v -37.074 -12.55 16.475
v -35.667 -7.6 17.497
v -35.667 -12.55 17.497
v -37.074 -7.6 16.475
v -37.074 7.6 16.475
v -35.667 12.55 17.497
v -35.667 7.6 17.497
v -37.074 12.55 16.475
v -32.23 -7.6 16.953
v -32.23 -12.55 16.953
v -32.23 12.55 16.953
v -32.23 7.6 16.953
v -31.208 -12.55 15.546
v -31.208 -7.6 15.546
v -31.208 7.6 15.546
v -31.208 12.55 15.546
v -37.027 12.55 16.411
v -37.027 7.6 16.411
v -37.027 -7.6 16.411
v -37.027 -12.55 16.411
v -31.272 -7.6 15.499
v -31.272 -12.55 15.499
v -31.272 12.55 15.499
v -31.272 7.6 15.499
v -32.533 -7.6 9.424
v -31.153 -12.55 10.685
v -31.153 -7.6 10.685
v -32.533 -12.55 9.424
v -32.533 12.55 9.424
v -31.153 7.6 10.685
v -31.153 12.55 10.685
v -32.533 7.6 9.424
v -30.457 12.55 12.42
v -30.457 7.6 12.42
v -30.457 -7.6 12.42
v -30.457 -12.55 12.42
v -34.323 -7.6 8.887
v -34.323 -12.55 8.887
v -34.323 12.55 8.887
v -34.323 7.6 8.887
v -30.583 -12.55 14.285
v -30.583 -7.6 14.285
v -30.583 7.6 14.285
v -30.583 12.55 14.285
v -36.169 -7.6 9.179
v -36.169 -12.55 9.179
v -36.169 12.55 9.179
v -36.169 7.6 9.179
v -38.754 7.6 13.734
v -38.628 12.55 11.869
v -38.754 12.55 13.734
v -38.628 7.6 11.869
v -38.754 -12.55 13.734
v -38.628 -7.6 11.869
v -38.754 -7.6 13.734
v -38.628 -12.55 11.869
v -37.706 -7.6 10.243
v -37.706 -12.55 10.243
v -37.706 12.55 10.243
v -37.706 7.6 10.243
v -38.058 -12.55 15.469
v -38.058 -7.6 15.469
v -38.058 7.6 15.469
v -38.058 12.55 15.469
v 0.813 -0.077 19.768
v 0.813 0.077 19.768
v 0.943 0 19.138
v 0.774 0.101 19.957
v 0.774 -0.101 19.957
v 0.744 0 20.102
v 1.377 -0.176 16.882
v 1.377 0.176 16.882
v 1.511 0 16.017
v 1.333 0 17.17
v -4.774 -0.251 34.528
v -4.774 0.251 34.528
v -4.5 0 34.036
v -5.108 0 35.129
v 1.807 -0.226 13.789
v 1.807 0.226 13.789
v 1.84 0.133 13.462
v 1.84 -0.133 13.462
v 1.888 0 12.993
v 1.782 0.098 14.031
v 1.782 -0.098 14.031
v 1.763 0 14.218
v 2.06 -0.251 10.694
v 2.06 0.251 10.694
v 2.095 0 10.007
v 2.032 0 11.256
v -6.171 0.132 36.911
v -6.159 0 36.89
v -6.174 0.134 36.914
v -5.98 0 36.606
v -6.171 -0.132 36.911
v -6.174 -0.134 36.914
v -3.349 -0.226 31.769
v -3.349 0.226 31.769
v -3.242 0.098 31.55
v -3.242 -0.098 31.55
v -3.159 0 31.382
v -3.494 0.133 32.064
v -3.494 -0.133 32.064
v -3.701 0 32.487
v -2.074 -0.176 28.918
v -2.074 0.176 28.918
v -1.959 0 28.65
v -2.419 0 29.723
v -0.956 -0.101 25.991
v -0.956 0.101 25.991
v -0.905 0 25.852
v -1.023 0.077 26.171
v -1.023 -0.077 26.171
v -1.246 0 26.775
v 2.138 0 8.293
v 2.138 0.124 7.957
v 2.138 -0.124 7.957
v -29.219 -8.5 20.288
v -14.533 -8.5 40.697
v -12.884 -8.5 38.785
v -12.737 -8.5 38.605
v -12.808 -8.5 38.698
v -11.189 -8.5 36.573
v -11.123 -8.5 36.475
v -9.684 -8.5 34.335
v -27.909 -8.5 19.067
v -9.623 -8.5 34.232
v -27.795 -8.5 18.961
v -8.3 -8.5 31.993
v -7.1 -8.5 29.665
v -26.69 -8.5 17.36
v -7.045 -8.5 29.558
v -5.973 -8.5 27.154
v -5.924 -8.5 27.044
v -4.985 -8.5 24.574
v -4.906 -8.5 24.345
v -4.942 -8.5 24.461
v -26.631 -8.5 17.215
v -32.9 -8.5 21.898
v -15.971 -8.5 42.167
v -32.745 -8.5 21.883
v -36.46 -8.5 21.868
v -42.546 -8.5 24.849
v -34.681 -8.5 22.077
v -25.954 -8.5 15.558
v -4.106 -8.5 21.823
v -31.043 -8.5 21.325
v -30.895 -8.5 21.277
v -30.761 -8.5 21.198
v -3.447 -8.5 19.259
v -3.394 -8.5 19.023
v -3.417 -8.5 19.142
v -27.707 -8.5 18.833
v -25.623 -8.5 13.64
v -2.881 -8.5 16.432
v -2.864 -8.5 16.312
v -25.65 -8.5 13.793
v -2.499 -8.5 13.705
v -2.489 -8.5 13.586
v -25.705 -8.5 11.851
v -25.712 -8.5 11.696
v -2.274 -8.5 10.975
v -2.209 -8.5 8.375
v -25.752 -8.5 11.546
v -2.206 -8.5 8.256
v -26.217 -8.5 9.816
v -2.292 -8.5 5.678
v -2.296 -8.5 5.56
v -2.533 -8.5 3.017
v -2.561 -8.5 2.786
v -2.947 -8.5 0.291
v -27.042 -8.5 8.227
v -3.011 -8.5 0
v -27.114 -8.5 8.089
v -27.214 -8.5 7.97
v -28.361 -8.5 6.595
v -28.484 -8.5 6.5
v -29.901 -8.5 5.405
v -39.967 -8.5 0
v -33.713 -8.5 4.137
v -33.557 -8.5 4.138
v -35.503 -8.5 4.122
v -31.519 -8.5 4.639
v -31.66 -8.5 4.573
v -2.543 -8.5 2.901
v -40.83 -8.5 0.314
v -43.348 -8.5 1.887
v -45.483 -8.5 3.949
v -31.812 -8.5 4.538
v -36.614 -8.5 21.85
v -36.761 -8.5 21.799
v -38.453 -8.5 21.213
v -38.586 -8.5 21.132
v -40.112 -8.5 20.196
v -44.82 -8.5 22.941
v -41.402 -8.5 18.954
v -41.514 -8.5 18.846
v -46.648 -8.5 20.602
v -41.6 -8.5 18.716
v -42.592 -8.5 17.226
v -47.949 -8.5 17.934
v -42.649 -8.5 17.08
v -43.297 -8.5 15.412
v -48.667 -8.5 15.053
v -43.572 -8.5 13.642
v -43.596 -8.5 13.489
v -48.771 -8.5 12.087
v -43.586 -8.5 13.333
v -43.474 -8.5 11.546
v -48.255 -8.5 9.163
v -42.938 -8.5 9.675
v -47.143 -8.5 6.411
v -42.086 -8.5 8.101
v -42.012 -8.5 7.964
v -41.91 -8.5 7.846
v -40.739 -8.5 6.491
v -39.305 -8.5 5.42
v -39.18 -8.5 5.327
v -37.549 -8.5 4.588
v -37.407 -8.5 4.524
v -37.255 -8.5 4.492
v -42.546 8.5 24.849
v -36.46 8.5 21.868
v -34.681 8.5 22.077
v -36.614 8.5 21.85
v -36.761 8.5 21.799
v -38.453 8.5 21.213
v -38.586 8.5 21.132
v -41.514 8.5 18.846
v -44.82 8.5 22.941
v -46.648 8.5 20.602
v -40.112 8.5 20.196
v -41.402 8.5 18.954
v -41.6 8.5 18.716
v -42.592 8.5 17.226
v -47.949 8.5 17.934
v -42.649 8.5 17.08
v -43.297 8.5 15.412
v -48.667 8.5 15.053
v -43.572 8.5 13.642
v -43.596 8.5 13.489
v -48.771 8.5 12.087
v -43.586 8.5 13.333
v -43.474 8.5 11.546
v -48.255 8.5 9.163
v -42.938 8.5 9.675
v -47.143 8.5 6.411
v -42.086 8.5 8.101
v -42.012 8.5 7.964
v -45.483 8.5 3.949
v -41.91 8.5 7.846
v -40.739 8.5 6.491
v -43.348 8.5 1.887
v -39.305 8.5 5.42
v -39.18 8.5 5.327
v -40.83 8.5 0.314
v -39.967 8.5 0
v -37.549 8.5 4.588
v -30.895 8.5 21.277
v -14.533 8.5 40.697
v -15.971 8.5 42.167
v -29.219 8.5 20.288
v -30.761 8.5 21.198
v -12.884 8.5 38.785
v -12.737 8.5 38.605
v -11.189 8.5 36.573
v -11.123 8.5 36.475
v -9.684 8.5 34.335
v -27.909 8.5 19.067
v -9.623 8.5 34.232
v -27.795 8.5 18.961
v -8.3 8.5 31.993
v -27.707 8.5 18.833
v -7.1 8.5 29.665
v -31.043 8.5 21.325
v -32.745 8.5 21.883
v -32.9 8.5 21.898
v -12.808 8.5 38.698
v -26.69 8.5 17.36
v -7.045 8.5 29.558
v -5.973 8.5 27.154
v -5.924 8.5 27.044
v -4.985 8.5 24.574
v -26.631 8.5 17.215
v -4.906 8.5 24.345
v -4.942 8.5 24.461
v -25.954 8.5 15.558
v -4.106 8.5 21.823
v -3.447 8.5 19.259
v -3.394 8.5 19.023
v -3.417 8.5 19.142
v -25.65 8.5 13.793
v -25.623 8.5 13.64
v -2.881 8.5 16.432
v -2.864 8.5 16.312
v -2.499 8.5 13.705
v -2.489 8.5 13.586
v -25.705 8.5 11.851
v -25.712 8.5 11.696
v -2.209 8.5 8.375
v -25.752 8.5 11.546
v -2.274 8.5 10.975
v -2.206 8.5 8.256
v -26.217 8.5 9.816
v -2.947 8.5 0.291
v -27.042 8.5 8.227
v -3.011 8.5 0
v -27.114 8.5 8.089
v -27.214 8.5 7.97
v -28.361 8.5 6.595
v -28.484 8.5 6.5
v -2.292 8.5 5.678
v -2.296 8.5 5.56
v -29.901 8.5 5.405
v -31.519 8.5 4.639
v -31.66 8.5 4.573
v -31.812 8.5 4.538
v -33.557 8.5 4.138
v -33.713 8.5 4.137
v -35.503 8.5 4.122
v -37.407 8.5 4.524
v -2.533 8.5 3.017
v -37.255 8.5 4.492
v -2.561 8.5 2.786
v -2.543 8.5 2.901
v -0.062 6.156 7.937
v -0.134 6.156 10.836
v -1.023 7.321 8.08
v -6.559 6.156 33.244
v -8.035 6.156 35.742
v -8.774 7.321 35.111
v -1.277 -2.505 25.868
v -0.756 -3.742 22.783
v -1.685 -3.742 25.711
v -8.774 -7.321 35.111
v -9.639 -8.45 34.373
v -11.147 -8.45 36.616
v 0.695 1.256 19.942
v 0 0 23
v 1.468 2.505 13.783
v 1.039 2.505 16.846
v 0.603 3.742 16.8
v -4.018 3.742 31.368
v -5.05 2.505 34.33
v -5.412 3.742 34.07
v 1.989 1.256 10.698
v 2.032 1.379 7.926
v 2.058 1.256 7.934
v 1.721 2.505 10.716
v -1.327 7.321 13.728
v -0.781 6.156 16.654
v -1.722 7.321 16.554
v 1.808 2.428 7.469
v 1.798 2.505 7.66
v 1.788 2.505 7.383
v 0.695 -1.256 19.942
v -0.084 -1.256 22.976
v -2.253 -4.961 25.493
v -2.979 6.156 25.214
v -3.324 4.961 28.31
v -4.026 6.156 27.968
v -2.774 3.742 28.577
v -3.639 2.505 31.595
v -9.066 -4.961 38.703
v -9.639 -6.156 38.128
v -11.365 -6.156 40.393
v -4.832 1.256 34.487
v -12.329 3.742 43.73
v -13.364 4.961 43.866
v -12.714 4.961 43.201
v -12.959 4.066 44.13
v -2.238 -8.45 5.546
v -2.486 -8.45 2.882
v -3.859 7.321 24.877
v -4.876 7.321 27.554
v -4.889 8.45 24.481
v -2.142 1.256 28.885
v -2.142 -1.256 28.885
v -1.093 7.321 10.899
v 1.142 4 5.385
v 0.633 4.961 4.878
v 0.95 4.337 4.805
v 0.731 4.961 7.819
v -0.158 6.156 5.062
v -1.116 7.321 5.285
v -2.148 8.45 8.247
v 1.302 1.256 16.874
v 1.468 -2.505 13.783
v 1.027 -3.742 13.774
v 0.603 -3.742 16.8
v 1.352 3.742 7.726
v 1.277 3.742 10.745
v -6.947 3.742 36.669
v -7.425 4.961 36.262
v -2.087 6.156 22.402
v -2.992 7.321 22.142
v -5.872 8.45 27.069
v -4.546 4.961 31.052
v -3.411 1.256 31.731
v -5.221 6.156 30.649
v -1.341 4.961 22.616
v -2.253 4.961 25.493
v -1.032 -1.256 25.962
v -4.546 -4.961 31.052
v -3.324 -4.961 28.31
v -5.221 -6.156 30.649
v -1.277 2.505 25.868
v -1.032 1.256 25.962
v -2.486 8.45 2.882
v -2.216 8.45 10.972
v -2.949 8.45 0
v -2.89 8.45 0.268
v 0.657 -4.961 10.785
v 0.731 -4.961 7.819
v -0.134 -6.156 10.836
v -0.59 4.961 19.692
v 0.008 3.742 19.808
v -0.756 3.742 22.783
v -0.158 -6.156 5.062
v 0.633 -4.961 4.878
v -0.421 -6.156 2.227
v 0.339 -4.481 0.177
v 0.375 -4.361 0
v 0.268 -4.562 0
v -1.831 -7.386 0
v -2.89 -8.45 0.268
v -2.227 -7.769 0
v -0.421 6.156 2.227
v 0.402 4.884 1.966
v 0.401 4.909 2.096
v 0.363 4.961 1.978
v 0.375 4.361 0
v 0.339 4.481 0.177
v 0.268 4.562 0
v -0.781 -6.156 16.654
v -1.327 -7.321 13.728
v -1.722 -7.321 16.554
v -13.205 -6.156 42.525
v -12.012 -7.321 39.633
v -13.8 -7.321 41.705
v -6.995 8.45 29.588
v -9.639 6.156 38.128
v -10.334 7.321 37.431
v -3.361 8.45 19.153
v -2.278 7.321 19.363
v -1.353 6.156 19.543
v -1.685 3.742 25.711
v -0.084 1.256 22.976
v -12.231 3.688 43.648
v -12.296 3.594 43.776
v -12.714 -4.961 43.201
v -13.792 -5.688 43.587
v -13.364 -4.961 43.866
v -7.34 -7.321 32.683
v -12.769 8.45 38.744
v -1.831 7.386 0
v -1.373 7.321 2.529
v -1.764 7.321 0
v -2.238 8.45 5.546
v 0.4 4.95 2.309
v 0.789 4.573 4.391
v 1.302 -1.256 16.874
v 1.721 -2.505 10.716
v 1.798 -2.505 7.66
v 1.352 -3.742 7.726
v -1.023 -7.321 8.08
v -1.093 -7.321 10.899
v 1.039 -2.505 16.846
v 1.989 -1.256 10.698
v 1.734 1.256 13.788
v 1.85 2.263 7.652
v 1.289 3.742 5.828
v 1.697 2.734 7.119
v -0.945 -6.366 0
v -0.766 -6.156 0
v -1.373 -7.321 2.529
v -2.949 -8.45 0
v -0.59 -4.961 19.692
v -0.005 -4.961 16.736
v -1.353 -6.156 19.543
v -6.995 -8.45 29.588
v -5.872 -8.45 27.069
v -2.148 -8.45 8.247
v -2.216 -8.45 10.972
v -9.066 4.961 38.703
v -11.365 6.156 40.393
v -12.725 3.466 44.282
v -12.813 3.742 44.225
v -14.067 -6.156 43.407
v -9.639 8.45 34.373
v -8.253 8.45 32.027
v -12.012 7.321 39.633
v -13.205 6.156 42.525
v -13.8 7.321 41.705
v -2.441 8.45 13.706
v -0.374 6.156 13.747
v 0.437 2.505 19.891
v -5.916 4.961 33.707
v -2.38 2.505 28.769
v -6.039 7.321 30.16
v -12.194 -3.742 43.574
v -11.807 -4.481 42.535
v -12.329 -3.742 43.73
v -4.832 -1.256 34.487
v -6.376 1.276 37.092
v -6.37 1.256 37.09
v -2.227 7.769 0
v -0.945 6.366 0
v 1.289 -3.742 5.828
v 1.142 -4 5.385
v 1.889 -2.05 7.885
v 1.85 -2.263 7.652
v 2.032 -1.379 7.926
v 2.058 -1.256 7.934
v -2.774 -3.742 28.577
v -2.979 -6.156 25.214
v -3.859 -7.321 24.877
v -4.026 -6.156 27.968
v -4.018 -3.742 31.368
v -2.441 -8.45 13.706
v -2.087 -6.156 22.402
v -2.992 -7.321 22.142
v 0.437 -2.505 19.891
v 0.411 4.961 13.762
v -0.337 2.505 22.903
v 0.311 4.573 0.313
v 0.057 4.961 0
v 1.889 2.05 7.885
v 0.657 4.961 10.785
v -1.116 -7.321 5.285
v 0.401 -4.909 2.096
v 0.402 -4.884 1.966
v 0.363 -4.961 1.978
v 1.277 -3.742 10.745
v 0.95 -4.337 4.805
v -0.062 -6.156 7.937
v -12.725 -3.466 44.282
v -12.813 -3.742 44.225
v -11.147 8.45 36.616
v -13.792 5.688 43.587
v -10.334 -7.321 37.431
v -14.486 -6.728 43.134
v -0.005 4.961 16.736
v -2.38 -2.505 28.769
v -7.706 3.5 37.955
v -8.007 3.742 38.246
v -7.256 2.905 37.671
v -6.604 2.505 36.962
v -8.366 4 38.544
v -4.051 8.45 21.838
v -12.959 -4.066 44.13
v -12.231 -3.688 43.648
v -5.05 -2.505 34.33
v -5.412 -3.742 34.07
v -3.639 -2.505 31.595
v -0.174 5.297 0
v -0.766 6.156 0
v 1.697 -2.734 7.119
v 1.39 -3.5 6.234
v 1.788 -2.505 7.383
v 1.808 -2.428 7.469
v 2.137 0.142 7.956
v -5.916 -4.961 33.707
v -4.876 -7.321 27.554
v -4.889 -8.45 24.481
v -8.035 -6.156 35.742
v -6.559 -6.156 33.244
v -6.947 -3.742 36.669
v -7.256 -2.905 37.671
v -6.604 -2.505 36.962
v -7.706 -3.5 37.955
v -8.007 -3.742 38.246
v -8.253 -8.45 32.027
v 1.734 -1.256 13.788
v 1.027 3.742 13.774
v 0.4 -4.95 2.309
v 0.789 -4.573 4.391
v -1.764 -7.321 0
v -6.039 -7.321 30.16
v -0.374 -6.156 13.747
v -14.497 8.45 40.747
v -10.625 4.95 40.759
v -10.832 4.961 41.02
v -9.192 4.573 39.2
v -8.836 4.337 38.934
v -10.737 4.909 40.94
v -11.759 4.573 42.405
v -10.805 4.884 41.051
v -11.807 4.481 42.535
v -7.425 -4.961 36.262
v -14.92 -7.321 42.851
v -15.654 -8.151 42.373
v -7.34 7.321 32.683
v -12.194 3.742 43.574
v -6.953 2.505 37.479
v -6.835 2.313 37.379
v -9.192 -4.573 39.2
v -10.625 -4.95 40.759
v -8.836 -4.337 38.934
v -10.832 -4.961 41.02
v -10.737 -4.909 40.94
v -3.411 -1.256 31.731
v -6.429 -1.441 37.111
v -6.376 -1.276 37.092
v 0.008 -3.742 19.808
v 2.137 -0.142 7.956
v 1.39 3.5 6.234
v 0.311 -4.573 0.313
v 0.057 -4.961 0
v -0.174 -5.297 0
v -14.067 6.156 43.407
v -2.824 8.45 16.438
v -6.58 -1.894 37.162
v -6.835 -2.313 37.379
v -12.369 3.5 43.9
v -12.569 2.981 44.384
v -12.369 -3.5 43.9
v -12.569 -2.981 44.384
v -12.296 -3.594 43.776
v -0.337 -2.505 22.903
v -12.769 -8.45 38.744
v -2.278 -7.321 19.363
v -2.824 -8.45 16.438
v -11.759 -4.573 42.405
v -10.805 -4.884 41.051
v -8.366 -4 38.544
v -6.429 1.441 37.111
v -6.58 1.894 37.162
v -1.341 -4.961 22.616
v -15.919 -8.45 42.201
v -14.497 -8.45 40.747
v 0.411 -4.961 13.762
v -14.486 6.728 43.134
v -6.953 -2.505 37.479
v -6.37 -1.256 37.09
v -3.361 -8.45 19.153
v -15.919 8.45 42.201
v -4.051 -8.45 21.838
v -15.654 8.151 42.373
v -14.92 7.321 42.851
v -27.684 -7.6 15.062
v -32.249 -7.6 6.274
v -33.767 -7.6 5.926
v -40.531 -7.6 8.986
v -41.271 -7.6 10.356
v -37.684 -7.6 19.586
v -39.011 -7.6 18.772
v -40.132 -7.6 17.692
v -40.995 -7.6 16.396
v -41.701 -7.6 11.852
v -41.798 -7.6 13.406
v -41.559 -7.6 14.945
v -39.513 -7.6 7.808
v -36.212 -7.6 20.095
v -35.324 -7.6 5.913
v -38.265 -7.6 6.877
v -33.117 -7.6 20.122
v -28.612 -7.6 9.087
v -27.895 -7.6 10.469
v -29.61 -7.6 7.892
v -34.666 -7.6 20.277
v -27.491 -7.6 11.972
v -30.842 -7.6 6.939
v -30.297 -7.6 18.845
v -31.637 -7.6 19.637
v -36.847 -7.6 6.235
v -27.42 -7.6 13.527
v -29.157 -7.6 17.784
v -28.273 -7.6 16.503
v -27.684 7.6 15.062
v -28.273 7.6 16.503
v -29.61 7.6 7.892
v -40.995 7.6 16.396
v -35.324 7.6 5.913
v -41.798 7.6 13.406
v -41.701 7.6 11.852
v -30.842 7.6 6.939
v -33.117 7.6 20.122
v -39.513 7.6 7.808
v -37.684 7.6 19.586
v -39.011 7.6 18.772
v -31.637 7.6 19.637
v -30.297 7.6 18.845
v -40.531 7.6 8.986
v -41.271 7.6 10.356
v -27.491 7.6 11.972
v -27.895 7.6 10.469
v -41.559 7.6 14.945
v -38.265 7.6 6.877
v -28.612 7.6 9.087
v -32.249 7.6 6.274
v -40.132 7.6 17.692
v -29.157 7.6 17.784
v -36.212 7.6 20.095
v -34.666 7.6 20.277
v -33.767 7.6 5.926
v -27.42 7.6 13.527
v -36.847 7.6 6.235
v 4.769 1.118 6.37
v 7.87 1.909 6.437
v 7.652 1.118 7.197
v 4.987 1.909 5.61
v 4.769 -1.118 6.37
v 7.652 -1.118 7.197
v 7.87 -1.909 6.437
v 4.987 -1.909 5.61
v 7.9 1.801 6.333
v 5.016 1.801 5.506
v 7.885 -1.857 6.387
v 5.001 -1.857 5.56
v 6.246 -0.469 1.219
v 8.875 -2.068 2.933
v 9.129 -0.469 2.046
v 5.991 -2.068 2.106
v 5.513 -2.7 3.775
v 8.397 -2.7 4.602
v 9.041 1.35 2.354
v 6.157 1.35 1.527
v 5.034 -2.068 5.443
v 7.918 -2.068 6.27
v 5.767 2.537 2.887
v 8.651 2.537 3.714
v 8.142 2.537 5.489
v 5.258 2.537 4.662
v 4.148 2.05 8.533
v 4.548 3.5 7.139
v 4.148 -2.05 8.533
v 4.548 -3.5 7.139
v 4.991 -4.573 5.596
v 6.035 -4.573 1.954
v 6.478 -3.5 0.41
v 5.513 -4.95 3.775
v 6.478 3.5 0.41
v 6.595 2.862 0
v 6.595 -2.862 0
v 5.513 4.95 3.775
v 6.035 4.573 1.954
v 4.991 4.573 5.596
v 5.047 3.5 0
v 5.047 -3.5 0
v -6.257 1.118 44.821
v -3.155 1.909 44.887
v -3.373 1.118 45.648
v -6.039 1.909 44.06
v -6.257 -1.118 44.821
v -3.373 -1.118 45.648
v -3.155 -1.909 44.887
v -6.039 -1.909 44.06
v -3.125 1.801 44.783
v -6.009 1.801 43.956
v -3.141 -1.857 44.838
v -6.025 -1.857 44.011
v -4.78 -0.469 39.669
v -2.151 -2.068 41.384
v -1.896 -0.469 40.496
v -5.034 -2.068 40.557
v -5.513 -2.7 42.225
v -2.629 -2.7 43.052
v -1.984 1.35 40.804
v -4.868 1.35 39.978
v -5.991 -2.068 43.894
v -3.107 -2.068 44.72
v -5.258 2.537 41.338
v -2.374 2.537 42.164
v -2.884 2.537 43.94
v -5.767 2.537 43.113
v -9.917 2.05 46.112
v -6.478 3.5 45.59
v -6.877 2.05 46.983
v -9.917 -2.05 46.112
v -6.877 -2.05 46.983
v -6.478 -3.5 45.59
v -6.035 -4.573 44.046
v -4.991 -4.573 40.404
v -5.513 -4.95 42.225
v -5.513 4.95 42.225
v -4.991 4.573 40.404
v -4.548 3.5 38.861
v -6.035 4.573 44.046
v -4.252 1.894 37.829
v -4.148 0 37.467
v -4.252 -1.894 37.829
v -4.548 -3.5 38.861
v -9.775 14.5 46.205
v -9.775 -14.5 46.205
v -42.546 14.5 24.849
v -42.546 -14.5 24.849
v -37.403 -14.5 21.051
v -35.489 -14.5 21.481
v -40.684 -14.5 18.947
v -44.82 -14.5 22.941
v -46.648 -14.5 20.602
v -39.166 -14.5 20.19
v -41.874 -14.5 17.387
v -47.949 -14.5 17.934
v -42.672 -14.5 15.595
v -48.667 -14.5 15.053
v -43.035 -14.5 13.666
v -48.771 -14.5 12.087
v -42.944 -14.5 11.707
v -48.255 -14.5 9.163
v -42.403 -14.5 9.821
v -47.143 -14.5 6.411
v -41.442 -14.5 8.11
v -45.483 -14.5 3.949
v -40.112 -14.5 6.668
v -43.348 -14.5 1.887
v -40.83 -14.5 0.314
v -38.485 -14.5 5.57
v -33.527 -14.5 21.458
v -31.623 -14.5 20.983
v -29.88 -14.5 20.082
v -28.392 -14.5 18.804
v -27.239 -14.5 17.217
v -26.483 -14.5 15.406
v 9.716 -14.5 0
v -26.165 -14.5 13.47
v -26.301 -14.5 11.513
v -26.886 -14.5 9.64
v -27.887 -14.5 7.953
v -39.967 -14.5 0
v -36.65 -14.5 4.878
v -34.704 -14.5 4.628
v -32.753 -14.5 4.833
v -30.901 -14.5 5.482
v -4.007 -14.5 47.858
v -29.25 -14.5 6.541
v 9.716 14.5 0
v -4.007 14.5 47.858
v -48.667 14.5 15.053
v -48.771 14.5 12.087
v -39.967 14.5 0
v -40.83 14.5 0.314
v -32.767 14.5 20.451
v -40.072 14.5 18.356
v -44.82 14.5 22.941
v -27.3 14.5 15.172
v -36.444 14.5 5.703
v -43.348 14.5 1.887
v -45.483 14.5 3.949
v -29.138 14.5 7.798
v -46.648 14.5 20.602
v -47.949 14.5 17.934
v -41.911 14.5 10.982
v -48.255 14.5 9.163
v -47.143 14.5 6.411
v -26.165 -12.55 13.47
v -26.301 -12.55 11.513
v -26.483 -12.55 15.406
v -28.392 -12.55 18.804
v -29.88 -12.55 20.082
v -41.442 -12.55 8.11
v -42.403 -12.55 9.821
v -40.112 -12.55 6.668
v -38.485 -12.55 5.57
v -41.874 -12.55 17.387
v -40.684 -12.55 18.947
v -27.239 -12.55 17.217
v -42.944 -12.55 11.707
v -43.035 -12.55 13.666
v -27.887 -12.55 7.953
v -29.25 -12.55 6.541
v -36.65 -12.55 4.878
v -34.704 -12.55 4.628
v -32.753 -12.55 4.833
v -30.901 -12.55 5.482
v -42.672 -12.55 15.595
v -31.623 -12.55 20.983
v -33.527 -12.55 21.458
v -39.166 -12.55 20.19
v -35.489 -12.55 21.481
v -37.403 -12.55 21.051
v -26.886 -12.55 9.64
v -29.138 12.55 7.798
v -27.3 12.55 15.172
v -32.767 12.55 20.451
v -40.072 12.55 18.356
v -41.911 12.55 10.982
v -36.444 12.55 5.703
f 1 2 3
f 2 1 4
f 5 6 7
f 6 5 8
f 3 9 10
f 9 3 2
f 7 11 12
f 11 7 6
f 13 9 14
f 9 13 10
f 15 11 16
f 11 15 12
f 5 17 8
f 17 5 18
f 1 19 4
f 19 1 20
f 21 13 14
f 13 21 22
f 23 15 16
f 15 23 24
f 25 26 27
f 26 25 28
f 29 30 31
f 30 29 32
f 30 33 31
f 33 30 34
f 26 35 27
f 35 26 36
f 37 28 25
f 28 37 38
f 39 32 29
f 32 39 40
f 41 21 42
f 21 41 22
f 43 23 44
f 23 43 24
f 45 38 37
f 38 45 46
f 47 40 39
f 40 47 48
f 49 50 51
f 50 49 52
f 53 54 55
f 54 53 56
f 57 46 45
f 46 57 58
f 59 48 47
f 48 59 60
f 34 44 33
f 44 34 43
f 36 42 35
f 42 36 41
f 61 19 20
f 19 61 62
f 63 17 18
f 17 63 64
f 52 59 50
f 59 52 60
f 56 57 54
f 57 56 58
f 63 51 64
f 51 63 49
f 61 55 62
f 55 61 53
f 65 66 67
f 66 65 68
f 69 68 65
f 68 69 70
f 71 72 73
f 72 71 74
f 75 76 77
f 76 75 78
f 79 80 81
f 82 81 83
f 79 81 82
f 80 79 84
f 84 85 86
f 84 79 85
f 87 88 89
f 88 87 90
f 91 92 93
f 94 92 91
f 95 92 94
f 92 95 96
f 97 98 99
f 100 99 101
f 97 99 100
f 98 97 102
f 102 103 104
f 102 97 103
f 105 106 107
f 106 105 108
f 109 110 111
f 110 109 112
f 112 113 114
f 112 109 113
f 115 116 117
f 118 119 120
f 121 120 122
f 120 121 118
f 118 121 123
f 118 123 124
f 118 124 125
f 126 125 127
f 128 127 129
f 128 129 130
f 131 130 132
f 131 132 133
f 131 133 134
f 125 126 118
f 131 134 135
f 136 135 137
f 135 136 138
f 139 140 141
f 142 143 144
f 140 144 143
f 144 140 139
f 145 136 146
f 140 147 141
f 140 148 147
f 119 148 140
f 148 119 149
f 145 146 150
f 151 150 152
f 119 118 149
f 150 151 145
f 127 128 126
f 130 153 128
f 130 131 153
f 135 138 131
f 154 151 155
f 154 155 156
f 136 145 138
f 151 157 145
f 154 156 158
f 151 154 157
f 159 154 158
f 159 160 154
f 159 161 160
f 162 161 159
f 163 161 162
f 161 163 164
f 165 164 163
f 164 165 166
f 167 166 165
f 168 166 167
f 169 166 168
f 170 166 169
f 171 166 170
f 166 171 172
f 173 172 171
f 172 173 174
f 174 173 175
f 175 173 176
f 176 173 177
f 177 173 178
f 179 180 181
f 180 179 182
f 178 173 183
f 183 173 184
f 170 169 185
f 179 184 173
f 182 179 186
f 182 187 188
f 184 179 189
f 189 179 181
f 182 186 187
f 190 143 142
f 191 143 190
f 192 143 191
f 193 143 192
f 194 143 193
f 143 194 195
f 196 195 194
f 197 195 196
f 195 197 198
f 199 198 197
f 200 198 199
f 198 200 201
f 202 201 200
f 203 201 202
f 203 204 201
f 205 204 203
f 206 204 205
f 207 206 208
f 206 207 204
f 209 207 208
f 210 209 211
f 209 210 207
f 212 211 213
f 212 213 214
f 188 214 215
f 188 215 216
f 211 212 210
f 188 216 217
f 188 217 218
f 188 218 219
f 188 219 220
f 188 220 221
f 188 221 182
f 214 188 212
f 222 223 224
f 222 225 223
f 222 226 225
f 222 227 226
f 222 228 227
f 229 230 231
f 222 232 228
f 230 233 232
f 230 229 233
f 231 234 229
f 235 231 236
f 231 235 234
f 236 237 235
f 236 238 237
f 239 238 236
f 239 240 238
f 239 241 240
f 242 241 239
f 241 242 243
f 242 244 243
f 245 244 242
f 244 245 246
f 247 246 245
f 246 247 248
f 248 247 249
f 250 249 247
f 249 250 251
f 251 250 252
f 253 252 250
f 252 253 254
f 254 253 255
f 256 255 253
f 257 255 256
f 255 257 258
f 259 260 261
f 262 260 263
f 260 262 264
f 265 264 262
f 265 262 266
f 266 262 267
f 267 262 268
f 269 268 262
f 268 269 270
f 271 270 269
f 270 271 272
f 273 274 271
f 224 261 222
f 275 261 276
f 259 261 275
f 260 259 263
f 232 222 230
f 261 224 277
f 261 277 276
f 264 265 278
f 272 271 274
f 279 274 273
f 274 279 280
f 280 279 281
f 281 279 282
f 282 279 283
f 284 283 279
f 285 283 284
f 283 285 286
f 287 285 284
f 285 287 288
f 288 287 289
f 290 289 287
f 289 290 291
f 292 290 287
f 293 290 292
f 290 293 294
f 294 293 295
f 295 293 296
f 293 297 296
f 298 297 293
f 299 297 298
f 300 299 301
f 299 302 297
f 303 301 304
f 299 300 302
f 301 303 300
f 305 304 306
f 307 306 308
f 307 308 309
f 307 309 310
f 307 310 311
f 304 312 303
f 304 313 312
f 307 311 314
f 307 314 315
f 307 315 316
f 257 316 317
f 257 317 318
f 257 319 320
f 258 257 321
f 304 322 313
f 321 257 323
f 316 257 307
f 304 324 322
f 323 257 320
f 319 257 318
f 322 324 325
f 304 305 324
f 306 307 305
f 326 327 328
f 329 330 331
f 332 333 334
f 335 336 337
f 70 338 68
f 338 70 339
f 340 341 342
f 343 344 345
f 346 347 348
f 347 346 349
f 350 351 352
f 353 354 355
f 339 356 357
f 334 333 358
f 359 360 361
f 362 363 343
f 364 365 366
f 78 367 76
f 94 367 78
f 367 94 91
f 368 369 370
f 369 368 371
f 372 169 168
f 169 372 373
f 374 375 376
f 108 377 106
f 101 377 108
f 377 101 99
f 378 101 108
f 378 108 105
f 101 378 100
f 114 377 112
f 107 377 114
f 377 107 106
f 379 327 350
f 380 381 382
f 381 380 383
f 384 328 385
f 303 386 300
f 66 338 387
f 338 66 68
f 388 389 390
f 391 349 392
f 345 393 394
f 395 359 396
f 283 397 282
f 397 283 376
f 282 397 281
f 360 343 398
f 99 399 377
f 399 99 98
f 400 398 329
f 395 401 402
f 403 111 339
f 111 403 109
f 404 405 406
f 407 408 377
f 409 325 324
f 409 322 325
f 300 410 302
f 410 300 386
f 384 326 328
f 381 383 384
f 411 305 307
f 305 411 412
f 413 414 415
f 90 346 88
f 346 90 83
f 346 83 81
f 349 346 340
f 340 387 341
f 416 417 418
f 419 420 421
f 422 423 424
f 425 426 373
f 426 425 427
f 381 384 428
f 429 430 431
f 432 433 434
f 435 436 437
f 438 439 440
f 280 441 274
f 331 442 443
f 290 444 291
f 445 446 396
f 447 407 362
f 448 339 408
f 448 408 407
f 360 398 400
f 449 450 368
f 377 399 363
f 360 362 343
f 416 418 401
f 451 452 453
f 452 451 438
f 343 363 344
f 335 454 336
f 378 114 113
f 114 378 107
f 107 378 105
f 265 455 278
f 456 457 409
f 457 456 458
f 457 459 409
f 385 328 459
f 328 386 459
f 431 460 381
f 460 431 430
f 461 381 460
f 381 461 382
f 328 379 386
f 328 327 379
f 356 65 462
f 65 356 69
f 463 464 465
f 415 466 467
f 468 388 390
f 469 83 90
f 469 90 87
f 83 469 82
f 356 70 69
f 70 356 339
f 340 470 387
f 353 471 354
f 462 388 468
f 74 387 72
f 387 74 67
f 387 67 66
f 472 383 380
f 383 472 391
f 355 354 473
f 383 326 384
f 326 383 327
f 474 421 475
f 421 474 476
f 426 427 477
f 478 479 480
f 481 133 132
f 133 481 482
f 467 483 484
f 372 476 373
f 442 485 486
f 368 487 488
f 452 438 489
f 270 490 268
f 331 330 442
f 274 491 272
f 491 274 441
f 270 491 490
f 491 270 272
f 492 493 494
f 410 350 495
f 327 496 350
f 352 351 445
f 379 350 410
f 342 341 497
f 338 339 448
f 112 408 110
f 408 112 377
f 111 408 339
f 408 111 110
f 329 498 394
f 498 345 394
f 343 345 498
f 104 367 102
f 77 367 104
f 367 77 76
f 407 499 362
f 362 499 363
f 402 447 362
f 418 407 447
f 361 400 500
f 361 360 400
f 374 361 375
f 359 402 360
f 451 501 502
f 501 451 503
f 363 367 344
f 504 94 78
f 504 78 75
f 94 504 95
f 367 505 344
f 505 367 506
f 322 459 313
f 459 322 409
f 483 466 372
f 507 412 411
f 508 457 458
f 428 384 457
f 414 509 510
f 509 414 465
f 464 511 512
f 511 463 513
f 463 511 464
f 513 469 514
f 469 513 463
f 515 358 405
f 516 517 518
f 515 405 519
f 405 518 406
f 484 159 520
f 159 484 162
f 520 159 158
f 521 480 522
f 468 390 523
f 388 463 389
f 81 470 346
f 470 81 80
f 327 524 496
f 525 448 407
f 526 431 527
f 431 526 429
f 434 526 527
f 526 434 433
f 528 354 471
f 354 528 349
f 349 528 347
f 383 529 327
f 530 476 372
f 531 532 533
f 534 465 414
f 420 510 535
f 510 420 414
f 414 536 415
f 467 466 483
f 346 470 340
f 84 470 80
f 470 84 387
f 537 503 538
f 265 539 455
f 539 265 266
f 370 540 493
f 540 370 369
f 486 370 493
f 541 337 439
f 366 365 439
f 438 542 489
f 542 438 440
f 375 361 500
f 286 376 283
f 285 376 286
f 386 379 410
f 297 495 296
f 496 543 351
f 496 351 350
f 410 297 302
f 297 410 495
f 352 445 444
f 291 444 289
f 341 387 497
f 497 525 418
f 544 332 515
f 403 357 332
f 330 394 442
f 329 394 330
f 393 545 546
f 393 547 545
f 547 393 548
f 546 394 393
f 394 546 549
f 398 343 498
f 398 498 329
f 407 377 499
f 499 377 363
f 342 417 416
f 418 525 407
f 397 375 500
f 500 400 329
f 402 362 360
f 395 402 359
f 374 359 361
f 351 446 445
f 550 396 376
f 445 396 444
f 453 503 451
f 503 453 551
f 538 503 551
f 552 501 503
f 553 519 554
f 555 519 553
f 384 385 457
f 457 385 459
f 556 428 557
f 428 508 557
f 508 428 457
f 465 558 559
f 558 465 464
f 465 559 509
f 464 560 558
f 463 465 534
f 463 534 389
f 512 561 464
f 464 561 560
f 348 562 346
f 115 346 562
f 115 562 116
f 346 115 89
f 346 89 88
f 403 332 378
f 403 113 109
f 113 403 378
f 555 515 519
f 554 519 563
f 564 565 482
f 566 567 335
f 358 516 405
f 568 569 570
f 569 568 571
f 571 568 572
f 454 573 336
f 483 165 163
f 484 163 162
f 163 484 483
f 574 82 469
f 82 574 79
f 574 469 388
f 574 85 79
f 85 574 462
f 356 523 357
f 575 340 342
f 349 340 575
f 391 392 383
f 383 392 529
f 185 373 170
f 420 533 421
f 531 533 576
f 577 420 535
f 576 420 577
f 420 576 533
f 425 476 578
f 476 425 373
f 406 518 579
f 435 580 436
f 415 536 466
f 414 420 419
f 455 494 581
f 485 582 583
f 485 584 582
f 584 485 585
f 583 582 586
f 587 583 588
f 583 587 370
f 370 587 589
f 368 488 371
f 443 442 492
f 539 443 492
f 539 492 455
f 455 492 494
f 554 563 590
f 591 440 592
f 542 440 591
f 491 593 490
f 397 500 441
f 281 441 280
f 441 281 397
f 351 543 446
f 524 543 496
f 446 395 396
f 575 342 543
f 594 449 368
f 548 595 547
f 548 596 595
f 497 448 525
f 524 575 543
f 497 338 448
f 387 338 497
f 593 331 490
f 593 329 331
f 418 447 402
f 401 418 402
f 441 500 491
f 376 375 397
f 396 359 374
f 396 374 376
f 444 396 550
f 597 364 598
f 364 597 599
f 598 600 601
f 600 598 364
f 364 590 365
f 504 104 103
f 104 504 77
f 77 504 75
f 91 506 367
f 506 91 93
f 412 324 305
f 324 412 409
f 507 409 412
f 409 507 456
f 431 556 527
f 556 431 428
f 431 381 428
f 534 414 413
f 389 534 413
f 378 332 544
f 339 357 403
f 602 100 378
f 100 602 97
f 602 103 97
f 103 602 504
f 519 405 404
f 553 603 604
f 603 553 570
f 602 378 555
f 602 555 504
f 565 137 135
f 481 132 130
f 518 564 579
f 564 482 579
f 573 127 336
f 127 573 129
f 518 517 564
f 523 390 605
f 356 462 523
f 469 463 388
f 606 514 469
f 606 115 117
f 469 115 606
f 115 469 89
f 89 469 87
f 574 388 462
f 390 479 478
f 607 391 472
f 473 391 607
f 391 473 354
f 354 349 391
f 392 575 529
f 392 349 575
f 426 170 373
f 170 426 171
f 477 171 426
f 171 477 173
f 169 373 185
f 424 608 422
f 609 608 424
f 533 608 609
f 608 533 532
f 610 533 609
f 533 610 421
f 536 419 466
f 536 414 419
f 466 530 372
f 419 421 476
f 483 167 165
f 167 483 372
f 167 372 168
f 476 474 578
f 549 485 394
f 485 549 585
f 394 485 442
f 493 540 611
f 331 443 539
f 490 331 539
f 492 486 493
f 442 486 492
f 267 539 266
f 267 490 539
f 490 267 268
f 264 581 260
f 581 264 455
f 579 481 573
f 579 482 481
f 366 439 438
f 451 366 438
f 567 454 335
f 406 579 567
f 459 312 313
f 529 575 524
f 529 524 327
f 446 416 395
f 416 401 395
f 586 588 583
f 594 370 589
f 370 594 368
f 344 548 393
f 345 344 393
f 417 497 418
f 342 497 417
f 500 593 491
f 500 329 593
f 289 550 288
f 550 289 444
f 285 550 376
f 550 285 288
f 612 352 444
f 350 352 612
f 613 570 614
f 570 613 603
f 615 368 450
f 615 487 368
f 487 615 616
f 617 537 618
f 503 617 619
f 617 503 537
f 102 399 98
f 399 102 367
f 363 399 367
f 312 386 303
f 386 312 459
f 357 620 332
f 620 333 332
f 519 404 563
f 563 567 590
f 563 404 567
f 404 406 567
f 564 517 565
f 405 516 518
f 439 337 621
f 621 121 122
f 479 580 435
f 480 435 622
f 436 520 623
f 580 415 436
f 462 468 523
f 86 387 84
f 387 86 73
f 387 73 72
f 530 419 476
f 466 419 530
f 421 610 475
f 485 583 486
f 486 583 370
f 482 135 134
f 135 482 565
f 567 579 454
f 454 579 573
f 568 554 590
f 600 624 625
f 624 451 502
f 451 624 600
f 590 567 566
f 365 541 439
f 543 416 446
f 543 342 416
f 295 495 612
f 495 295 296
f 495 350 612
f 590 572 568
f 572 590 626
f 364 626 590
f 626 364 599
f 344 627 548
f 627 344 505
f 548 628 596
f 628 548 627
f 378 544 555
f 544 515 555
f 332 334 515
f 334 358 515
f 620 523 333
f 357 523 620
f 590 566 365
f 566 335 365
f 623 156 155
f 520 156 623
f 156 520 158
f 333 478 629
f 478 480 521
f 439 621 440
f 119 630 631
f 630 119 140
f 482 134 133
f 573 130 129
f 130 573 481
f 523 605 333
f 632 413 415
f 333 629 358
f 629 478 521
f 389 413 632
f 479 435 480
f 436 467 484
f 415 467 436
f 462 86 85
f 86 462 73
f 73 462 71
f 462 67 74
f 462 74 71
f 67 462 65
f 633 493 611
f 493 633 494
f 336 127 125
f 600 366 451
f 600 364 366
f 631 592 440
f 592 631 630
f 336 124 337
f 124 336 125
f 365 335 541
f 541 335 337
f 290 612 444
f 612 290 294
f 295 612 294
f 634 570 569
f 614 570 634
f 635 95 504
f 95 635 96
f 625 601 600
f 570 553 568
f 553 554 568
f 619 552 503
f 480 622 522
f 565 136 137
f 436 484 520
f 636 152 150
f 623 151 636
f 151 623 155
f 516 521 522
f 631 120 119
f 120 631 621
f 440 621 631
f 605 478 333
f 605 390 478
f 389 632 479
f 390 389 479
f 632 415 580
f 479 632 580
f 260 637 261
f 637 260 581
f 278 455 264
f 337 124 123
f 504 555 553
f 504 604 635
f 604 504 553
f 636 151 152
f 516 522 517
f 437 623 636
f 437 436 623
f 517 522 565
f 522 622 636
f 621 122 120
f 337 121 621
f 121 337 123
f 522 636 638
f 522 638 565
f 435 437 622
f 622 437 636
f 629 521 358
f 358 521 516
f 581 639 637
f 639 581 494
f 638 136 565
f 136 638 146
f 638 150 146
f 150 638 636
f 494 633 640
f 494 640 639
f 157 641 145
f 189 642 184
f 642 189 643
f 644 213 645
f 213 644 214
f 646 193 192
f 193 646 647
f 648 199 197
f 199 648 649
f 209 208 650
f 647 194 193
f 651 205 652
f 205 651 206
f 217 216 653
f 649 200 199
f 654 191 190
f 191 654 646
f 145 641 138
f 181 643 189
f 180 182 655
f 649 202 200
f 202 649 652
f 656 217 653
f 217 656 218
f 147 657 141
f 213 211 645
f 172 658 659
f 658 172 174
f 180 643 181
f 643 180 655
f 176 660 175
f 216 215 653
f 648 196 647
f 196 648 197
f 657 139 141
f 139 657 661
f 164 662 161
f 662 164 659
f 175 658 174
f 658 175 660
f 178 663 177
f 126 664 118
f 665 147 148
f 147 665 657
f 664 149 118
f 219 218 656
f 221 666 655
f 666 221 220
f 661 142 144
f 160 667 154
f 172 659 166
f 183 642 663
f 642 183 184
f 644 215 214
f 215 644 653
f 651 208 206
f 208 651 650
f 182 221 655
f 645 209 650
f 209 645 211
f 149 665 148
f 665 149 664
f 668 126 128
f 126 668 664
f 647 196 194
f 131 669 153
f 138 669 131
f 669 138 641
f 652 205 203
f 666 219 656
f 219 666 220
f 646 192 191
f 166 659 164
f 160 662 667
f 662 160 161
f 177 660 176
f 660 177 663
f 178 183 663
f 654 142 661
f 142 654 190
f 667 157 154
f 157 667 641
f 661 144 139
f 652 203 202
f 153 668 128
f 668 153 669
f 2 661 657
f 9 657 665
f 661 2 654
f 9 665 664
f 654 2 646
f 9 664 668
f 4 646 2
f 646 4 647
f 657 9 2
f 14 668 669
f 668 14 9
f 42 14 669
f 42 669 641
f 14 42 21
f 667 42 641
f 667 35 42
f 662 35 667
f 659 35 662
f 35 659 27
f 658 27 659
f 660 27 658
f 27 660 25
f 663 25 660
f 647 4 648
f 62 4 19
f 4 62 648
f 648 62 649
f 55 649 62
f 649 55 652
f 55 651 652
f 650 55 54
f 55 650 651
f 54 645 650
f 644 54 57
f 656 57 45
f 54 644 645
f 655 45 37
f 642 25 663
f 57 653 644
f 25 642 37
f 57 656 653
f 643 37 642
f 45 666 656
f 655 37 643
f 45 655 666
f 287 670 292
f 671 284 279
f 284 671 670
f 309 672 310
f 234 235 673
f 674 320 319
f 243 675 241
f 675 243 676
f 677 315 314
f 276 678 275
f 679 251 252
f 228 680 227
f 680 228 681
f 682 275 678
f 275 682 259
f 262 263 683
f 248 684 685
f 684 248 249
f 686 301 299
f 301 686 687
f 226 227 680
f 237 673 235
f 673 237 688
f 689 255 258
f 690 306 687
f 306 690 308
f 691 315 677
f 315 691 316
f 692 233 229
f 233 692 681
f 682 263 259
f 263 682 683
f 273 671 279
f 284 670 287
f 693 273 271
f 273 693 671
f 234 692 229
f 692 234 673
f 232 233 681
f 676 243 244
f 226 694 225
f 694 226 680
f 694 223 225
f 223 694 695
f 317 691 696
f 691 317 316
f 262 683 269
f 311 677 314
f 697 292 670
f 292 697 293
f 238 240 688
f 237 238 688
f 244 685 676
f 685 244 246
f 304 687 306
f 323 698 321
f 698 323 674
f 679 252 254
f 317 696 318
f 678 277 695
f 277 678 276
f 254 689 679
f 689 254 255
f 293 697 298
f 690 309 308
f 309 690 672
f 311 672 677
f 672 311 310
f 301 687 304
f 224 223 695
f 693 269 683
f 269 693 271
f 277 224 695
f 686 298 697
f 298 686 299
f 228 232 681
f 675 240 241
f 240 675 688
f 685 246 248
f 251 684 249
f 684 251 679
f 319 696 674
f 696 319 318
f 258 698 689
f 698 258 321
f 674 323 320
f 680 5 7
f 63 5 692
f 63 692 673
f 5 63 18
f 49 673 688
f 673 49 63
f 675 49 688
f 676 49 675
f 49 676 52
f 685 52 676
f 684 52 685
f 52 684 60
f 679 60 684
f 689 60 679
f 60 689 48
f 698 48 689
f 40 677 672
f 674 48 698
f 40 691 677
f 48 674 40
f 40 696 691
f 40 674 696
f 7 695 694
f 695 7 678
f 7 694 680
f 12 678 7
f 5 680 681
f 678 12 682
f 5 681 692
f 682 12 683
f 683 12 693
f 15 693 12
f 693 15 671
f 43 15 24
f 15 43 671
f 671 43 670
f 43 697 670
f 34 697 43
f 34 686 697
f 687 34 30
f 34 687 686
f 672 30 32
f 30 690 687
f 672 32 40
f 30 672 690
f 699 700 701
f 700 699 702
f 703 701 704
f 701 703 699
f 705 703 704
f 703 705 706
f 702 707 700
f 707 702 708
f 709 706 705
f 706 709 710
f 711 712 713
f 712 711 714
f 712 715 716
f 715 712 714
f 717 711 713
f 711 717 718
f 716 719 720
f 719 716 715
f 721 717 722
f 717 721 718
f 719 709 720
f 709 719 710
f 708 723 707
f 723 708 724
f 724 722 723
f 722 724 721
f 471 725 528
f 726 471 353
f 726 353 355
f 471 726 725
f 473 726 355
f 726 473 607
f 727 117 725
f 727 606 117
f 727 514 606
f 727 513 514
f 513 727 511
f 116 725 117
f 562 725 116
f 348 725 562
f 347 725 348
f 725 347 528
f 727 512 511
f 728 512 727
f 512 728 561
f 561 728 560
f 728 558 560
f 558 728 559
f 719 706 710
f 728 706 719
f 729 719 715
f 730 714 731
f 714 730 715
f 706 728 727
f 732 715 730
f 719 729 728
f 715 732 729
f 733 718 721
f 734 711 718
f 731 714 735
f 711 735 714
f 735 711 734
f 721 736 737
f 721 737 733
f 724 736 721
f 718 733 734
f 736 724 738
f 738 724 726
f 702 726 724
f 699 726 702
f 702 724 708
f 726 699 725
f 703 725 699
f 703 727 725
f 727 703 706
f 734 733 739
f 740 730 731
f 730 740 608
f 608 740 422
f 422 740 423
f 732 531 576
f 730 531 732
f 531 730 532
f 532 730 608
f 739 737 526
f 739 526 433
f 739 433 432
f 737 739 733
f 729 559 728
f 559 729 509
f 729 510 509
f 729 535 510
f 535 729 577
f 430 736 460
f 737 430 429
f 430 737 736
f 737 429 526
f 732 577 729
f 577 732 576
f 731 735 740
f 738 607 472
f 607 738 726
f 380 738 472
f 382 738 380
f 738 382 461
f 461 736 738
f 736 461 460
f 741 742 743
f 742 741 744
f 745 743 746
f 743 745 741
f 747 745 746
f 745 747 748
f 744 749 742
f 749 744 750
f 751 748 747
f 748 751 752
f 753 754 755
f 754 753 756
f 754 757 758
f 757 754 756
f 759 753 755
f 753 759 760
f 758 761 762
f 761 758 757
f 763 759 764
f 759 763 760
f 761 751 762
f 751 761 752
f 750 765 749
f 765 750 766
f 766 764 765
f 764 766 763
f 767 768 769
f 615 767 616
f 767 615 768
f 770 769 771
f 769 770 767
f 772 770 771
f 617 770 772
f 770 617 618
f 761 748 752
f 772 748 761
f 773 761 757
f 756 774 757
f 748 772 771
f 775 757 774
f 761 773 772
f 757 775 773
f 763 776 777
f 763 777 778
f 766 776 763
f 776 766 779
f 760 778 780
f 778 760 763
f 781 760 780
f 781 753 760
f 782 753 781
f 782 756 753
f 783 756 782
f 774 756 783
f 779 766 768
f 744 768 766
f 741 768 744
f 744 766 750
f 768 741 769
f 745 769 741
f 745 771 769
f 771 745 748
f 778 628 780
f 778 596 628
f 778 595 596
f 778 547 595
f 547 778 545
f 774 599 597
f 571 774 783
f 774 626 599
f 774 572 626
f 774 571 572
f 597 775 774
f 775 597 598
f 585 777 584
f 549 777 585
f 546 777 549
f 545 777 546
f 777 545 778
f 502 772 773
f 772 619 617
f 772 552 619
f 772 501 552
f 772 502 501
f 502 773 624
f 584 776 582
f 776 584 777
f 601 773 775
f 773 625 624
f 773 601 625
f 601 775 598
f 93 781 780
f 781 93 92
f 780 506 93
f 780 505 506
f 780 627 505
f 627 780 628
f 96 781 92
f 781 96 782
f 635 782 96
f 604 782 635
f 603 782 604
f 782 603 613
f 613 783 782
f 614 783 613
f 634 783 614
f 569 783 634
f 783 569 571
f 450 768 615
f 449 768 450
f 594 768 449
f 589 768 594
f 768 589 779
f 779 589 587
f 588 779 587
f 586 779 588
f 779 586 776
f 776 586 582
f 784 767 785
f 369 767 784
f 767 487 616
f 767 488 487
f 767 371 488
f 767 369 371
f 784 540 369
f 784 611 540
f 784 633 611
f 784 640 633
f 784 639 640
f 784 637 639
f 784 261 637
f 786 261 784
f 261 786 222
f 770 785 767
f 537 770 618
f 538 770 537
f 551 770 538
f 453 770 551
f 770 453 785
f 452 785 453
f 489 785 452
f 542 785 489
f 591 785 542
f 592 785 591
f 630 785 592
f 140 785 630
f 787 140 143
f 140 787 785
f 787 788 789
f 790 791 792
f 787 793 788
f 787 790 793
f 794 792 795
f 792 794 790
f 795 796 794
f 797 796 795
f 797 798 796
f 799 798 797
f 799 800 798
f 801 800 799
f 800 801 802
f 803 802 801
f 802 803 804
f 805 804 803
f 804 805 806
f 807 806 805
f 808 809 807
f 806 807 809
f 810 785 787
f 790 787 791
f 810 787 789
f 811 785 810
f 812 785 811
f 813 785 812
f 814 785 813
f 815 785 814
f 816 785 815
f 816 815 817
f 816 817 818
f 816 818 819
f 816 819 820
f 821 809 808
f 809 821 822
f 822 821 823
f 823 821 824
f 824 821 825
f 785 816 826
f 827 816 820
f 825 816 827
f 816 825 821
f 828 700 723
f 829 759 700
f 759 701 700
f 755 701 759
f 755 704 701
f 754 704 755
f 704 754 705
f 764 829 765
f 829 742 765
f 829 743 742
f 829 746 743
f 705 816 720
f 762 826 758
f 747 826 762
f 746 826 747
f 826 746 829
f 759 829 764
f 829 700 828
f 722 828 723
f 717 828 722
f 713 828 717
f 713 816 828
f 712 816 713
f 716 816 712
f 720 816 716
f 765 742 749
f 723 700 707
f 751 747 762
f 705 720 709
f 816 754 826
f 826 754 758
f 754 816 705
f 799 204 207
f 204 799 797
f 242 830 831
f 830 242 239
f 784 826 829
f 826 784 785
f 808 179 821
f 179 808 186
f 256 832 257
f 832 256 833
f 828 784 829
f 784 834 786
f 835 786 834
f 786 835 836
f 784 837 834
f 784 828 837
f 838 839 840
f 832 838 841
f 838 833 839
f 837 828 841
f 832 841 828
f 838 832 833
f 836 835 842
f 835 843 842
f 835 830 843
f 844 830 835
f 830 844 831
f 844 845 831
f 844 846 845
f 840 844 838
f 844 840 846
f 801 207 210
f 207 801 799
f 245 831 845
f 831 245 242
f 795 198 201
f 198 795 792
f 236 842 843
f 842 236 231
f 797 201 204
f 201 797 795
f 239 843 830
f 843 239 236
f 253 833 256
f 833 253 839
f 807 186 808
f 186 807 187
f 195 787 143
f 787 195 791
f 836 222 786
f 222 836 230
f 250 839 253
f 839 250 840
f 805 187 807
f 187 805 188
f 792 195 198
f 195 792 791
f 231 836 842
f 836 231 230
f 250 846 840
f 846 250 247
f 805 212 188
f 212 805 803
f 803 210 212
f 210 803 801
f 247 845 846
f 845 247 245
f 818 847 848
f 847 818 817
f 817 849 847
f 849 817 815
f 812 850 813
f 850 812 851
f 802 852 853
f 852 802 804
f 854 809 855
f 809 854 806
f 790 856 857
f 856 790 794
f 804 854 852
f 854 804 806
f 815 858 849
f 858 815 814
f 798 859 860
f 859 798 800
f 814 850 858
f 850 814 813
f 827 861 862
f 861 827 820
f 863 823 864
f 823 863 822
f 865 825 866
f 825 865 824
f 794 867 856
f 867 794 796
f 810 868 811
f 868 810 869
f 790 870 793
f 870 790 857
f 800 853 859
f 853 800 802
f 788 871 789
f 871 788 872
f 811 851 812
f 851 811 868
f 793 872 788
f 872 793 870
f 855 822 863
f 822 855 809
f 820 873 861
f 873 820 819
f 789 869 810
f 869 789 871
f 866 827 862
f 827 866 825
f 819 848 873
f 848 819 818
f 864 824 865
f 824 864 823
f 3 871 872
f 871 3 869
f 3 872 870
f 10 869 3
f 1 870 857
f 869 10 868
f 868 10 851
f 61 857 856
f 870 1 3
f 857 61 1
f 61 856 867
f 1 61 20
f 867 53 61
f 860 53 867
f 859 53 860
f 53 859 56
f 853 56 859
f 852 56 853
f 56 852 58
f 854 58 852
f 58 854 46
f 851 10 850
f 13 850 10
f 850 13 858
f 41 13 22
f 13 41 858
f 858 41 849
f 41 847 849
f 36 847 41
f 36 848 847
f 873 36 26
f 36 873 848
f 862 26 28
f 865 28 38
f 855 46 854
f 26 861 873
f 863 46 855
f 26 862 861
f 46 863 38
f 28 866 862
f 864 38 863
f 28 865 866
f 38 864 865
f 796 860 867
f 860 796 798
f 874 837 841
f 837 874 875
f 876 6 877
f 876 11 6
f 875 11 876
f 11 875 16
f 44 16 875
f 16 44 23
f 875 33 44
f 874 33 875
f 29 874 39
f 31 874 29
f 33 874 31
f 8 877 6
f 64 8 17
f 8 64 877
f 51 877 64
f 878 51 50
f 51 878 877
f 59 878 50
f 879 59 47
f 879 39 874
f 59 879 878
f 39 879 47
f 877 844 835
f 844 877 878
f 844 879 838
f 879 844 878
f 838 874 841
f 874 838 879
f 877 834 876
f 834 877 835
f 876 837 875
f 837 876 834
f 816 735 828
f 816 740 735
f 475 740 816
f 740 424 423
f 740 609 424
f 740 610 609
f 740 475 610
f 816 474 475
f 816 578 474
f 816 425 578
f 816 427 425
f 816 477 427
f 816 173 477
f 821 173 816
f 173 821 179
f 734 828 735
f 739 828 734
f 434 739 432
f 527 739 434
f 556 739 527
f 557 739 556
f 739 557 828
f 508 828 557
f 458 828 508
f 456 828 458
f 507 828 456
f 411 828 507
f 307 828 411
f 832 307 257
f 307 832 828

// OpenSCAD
slop = .2;

m8_dia = 8;
m8_rad = m8_dia/2+slop;
m8_cap_rad = 12/2;
m8_nut_thick = 6.8;
m8_nut_dia = 14.6;
m8_nut_rad = m8_nut_dia/2+slop;
m8_washer_dia = 16;
m8_washer_rad = m8_washer_dia/2+slop;
m8_washer_thick = 1.8;

m5_nut_rad = 8.79/2+slop;
m5_nut_height = 4.7;
m5_rad = 5/2+slop;
m5_cap_rad = 9/2+slop;

wall = 6;

%cylinder(r=m8_washer_rad,h=20);
%rotate([90,0,0])translate([-34.5,13,-2]) cylinder(r=m8_rad, h=30, center=true);

//the wheel
//translate([-31,T/2,9]) rotate([90,0,0]) //this puts the wheel in the carrier
*wheel();

//the carrier
//rotated for printing
difference(){
	translate([0,0,23]) rotate([0,-16,0])
	carrier();
	translate([0,0,-50]) cube([100,100,100], center=true);
}

module carrier(){
	thickness = wall+wall+1+1+T;
	difference(){
		union(){
			hull(){
				cube([wall, thickness, 50], center=true);
				
				translate([-D/2-wall,0,0]) rotate([90,0,0]) cylinder(r=m8_washer_rad+wall, h=thickness, center=true);
			}
		}

		//mount the wheel
		translate([-D/2-wall,0,0]) rotate([-90,0,0]) {
			rotate([0,0,25]) cap_cylinder(r=m8_rad, h=50, center=true);
			difference(){
				scale([1,1.25,1]) intersection(){
					cylinder(r=D/2+wall,h=T+2,center=true,$fn=100);
					scale([1,1,.5]) sphere(r=D/2+wall, $fn=90);
				}
				//bumps to hold the wheel centered
				for(i=[0,1]) mirror([0,0,i]) translate([0,0,-T/2-1.1]) cylinder(r1=m8_washer_rad+1, r2=m8_washer_rad-1, h=1);
			}
		}
		
		//bolt indent
		translate([-D/2-wall,0,0])rotate([-90,0,0]) translate([0,0,-T/2-1.05-wall]) cylinder(r=m8_washer_rad+.25, h=2);
		//nut indent
		mirror([0,1,0]) translate([-D/2-wall,0,0])rotate([-90,0,0]) translate([0,0,-T/2-1.05-wall]) cylinder(r=m8_nut_rad+.1, h=2, $fn=6);

		//mount the carrier
		for(i=[-20,20]) translate([0,0,i]) rotate([0,90,0]){
			rotate([0,0,-90]) cap_cylinder(r=m5_rad, h=30, center=true);
			translate([0,0,-30]) rotate([0,0,-90]) cap_cylinder(r=m5_cap_rad+.25, h=30);
		}
	}
}

// outer diameter of ring
D=60;
// thickness
T=15;
// clearance
tol=.3;
number_of_planets=6;
number_of_teeth_on_planets=5;
approximate_number_of_teeth_on_sun=11;
// pressure angle
P=45;//[30:60]
// number of teeth to twist across
nTwist=1;
// width of center hole
w=m8_dia+slop;

DR=0.5*1;// maximum depth ratio of teeth

m=round(number_of_planets);
np=round(number_of_teeth_on_planets);
ns1=approximate_number_of_teeth_on_sun;
k1=round(2/m*(ns1+np));
k= k1*m%2!=0 ? k1+1 : k1;
ns=k*m/2-np;
echo(ns);
nr=ns+2*np;
pitchD=0.9*D/(1+min(PI/(2*nr*tan(P)),PI*DR/nr));
pitch=pitchD*PI/nr;
echo(pitch);
helix_angle=atan(2*nTwist*pitch/T);
echo(helix_angle);

phi=$t*360/m;
module wheel(){
	translate([0,0,T/2]){
		difference(){
			intersection(){
				cylinder(r=D/2+1,h=T,center=true,$fn=100);
				scale([1,1,.8]) sphere(r=D/2+1, $fn=90);
			}
			render() herringbone(nr,pitch,P,DR,-tol,helix_angle,T+0.2);
		}
		rotate([0,0,(np+1)*180/ns+phi*(ns+np)*2/ns])
		difference(){
			mirror([0,1,0])
				render() herringbone(ns,pitch,P,DR,tol,helix_angle,T);
			cylinder(r=w/2,h=T+1,center=true);
		}
		for(i=[1:m])rotate([0,0,i*360/m+phi])translate([pitchD/2*(ns+np)/nr,0,0])
			render() rotate([0,0,i*ns/m*360/np-phi*(ns+np)/np-phi])
				herringbone(np,pitch,P,DR,tol,helix_angle,T);
	}
}

module rack(
	number_of_teeth=15,
	circular_pitch=10,
	pressure_angle=28,
	helix_angle=0,
	clearance=0,
	gear_thickness=5,
	flat=false){
addendum=circular_pitch/(4*tan(pressure_angle));

flat_extrude(h=gear_thickness,flat=flat)translate([0,-clearance*cos(pressure_angle)/2])
	union(){
		translate([0,-0.5-addendum])square([number_of_teeth*circular_pitch,1],center=true);
		for(i=[1:number_of_teeth])
			translate([circular_pitch*(i-number_of_teeth/2-0.5),0])
			polygon(points=[[-circular_pitch/2,-addendum],[circular_pitch/2,-addendum],[0,addendum]]);
	}
}

module herringbone(
	number_of_teeth=15,
	circular_pitch=10,
	pressure_angle=28,
	depth_ratio=1,
	clearance=0,
	helix_angle=0,
	gear_thickness=5){
union(){
	gear(number_of_teeth,
		circular_pitch,
		pressure_angle,
		depth_ratio,
		clearance,
		helix_angle,
		gear_thickness/2);
	mirror([0,0,1])
		gear(number_of_teeth,
			circular_pitch,
			pressure_angle,
			depth_ratio,
			clearance,
			helix_angle,
			gear_thickness/2);
}}

module gear (
	number_of_teeth=15,
	circular_pitch=10,
	pressure_angle=28,
	depth_ratio=1,
	clearance=0,
	helix_angle=0,
	gear_thickness=5,
	flat=false){
pitch_radius = number_of_teeth*circular_pitch/(2*PI);
twist=tan(helix_angle)*gear_thickness/pitch_radius*180/PI;

flat_extrude(h=gear_thickness,twist=twist,flat=flat)
	gear2D (
		number_of_teeth,
		circular_pitch,
		pressure_angle,
		depth_ratio,
		clearance);
}

module flat_extrude(h,twist,flat){
	if(flat==false)
		linear_extrude(height=h,twist=twist,slices=twist/6)child(0);
	else
		child(0);
}

module gear2D (
	number_of_teeth,
	circular_pitch,
	pressure_angle,
	depth_ratio,
	clearance){
pitch_radius = number_of_teeth*circular_pitch/(2*PI);
base_radius = pitch_radius*cos(pressure_angle);
depth=circular_pitch/(2*tan(pressure_angle));
outer_radius = clearance<0 ? pitch_radius+depth/2-clearance : pitch_radius+depth/2;
root_radius1 = pitch_radius-depth/2-clearance/2;
root_radius = (clearance<0 && root_radius1<base_radius) ? base_radius : root_radius1;
backlash_angle = clearance/(pitch_radius*cos(pressure_angle)) * 180 / PI;
half_thick_angle = 90/number_of_teeth - backlash_angle/2;
pitch_point = involute (base_radius, involute_intersect_angle (base_radius, pitch_radius));
pitch_angle = atan2 (pitch_point[1], pitch_point[0]);
min_radius = max (base_radius,root_radius);

intersection(){
	rotate(90/number_of_teeth)
		circle($fn=number_of_teeth*3,r=pitch_radius+depth_ratio*circular_pitch/2-clearance/2);
	union(){
		rotate(90/number_of_teeth)
			circle($fn=number_of_teeth*2,r=max(root_radius,pitch_radius-depth_ratio*circular_pitch/2-clearance/2));
		for (i = [1:number_of_teeth])rotate(i*360/number_of_teeth){
			halftooth (
				pitch_angle,
				base_radius,
				min_radius,
				outer_radius,
				half_thick_angle);		
			mirror([0,1])halftooth (
				pitch_angle,
				base_radius,
				min_radius,
				outer_radius,
				half_thick_angle);
		}
	}
}}

module halftooth (
	pitch_angle,
	base_radius,
	min_radius,
	outer_radius,
	half_thick_angle){
index=[0,1,2,3,4,5];
start_angle = max(involute_intersect_angle (base_radius, min_radius)-5,0);
stop_angle = involute_intersect_angle (base_radius, outer_radius);
angle=index*(stop_angle-start_angle)/index[len(index)-1];
p=[[0,0],
	involute(base_radius,angle[0]+start_angle),
	involute(base_radius,angle[1]+start_angle),
	involute(base_radius,angle[2]+start_angle),
	involute(base_radius,angle[3]+start_angle),
	involute(base_radius,angle[4]+start_angle),
	involute(base_radius,angle[5]+start_angle)];

difference(){
	rotate(-pitch_angle-half_thick_angle)polygon(points=p);
	square(2*outer_radius);
}}

// Mathematical Functions
//===============

// Finds the angle of the involute about the base radius at the given distance (radius) from it's center.
//source: http://www.mathhelpforum.com/math-help/geometry/136011-circle-involute-solving-y-any-given-x.html

function involute_intersect_angle (base_radius, radius) = sqrt (pow (radius/base_radius, 2) - 1) * 180 / PI;

// Calculate the involute position for a given base radius and involute angle.

function involute (base_radius, involute_angle) =
[
	base_radius*(cos (involute_angle) + involute_angle*PI/180*sin (involute_angle)),
	base_radius*(sin (involute_angle) - involute_angle*PI/180*cos (involute_angle))
];

module cap_cylinder(r=1, h=1, center=false){
	render() union() {
		cylinder(r=r, h=h, center=center);
		intersection(){
			rotate([0,0,22.5]) cylinder(r=r/cos(180/8), h=h, $fn=8, center=center);
			translate([0,-r/cos(180/4),0]) rotate([0,0,0]) cylinder(r=r/cos(180/4), h=h, $fn=4, center=center);
		}
	}
}
